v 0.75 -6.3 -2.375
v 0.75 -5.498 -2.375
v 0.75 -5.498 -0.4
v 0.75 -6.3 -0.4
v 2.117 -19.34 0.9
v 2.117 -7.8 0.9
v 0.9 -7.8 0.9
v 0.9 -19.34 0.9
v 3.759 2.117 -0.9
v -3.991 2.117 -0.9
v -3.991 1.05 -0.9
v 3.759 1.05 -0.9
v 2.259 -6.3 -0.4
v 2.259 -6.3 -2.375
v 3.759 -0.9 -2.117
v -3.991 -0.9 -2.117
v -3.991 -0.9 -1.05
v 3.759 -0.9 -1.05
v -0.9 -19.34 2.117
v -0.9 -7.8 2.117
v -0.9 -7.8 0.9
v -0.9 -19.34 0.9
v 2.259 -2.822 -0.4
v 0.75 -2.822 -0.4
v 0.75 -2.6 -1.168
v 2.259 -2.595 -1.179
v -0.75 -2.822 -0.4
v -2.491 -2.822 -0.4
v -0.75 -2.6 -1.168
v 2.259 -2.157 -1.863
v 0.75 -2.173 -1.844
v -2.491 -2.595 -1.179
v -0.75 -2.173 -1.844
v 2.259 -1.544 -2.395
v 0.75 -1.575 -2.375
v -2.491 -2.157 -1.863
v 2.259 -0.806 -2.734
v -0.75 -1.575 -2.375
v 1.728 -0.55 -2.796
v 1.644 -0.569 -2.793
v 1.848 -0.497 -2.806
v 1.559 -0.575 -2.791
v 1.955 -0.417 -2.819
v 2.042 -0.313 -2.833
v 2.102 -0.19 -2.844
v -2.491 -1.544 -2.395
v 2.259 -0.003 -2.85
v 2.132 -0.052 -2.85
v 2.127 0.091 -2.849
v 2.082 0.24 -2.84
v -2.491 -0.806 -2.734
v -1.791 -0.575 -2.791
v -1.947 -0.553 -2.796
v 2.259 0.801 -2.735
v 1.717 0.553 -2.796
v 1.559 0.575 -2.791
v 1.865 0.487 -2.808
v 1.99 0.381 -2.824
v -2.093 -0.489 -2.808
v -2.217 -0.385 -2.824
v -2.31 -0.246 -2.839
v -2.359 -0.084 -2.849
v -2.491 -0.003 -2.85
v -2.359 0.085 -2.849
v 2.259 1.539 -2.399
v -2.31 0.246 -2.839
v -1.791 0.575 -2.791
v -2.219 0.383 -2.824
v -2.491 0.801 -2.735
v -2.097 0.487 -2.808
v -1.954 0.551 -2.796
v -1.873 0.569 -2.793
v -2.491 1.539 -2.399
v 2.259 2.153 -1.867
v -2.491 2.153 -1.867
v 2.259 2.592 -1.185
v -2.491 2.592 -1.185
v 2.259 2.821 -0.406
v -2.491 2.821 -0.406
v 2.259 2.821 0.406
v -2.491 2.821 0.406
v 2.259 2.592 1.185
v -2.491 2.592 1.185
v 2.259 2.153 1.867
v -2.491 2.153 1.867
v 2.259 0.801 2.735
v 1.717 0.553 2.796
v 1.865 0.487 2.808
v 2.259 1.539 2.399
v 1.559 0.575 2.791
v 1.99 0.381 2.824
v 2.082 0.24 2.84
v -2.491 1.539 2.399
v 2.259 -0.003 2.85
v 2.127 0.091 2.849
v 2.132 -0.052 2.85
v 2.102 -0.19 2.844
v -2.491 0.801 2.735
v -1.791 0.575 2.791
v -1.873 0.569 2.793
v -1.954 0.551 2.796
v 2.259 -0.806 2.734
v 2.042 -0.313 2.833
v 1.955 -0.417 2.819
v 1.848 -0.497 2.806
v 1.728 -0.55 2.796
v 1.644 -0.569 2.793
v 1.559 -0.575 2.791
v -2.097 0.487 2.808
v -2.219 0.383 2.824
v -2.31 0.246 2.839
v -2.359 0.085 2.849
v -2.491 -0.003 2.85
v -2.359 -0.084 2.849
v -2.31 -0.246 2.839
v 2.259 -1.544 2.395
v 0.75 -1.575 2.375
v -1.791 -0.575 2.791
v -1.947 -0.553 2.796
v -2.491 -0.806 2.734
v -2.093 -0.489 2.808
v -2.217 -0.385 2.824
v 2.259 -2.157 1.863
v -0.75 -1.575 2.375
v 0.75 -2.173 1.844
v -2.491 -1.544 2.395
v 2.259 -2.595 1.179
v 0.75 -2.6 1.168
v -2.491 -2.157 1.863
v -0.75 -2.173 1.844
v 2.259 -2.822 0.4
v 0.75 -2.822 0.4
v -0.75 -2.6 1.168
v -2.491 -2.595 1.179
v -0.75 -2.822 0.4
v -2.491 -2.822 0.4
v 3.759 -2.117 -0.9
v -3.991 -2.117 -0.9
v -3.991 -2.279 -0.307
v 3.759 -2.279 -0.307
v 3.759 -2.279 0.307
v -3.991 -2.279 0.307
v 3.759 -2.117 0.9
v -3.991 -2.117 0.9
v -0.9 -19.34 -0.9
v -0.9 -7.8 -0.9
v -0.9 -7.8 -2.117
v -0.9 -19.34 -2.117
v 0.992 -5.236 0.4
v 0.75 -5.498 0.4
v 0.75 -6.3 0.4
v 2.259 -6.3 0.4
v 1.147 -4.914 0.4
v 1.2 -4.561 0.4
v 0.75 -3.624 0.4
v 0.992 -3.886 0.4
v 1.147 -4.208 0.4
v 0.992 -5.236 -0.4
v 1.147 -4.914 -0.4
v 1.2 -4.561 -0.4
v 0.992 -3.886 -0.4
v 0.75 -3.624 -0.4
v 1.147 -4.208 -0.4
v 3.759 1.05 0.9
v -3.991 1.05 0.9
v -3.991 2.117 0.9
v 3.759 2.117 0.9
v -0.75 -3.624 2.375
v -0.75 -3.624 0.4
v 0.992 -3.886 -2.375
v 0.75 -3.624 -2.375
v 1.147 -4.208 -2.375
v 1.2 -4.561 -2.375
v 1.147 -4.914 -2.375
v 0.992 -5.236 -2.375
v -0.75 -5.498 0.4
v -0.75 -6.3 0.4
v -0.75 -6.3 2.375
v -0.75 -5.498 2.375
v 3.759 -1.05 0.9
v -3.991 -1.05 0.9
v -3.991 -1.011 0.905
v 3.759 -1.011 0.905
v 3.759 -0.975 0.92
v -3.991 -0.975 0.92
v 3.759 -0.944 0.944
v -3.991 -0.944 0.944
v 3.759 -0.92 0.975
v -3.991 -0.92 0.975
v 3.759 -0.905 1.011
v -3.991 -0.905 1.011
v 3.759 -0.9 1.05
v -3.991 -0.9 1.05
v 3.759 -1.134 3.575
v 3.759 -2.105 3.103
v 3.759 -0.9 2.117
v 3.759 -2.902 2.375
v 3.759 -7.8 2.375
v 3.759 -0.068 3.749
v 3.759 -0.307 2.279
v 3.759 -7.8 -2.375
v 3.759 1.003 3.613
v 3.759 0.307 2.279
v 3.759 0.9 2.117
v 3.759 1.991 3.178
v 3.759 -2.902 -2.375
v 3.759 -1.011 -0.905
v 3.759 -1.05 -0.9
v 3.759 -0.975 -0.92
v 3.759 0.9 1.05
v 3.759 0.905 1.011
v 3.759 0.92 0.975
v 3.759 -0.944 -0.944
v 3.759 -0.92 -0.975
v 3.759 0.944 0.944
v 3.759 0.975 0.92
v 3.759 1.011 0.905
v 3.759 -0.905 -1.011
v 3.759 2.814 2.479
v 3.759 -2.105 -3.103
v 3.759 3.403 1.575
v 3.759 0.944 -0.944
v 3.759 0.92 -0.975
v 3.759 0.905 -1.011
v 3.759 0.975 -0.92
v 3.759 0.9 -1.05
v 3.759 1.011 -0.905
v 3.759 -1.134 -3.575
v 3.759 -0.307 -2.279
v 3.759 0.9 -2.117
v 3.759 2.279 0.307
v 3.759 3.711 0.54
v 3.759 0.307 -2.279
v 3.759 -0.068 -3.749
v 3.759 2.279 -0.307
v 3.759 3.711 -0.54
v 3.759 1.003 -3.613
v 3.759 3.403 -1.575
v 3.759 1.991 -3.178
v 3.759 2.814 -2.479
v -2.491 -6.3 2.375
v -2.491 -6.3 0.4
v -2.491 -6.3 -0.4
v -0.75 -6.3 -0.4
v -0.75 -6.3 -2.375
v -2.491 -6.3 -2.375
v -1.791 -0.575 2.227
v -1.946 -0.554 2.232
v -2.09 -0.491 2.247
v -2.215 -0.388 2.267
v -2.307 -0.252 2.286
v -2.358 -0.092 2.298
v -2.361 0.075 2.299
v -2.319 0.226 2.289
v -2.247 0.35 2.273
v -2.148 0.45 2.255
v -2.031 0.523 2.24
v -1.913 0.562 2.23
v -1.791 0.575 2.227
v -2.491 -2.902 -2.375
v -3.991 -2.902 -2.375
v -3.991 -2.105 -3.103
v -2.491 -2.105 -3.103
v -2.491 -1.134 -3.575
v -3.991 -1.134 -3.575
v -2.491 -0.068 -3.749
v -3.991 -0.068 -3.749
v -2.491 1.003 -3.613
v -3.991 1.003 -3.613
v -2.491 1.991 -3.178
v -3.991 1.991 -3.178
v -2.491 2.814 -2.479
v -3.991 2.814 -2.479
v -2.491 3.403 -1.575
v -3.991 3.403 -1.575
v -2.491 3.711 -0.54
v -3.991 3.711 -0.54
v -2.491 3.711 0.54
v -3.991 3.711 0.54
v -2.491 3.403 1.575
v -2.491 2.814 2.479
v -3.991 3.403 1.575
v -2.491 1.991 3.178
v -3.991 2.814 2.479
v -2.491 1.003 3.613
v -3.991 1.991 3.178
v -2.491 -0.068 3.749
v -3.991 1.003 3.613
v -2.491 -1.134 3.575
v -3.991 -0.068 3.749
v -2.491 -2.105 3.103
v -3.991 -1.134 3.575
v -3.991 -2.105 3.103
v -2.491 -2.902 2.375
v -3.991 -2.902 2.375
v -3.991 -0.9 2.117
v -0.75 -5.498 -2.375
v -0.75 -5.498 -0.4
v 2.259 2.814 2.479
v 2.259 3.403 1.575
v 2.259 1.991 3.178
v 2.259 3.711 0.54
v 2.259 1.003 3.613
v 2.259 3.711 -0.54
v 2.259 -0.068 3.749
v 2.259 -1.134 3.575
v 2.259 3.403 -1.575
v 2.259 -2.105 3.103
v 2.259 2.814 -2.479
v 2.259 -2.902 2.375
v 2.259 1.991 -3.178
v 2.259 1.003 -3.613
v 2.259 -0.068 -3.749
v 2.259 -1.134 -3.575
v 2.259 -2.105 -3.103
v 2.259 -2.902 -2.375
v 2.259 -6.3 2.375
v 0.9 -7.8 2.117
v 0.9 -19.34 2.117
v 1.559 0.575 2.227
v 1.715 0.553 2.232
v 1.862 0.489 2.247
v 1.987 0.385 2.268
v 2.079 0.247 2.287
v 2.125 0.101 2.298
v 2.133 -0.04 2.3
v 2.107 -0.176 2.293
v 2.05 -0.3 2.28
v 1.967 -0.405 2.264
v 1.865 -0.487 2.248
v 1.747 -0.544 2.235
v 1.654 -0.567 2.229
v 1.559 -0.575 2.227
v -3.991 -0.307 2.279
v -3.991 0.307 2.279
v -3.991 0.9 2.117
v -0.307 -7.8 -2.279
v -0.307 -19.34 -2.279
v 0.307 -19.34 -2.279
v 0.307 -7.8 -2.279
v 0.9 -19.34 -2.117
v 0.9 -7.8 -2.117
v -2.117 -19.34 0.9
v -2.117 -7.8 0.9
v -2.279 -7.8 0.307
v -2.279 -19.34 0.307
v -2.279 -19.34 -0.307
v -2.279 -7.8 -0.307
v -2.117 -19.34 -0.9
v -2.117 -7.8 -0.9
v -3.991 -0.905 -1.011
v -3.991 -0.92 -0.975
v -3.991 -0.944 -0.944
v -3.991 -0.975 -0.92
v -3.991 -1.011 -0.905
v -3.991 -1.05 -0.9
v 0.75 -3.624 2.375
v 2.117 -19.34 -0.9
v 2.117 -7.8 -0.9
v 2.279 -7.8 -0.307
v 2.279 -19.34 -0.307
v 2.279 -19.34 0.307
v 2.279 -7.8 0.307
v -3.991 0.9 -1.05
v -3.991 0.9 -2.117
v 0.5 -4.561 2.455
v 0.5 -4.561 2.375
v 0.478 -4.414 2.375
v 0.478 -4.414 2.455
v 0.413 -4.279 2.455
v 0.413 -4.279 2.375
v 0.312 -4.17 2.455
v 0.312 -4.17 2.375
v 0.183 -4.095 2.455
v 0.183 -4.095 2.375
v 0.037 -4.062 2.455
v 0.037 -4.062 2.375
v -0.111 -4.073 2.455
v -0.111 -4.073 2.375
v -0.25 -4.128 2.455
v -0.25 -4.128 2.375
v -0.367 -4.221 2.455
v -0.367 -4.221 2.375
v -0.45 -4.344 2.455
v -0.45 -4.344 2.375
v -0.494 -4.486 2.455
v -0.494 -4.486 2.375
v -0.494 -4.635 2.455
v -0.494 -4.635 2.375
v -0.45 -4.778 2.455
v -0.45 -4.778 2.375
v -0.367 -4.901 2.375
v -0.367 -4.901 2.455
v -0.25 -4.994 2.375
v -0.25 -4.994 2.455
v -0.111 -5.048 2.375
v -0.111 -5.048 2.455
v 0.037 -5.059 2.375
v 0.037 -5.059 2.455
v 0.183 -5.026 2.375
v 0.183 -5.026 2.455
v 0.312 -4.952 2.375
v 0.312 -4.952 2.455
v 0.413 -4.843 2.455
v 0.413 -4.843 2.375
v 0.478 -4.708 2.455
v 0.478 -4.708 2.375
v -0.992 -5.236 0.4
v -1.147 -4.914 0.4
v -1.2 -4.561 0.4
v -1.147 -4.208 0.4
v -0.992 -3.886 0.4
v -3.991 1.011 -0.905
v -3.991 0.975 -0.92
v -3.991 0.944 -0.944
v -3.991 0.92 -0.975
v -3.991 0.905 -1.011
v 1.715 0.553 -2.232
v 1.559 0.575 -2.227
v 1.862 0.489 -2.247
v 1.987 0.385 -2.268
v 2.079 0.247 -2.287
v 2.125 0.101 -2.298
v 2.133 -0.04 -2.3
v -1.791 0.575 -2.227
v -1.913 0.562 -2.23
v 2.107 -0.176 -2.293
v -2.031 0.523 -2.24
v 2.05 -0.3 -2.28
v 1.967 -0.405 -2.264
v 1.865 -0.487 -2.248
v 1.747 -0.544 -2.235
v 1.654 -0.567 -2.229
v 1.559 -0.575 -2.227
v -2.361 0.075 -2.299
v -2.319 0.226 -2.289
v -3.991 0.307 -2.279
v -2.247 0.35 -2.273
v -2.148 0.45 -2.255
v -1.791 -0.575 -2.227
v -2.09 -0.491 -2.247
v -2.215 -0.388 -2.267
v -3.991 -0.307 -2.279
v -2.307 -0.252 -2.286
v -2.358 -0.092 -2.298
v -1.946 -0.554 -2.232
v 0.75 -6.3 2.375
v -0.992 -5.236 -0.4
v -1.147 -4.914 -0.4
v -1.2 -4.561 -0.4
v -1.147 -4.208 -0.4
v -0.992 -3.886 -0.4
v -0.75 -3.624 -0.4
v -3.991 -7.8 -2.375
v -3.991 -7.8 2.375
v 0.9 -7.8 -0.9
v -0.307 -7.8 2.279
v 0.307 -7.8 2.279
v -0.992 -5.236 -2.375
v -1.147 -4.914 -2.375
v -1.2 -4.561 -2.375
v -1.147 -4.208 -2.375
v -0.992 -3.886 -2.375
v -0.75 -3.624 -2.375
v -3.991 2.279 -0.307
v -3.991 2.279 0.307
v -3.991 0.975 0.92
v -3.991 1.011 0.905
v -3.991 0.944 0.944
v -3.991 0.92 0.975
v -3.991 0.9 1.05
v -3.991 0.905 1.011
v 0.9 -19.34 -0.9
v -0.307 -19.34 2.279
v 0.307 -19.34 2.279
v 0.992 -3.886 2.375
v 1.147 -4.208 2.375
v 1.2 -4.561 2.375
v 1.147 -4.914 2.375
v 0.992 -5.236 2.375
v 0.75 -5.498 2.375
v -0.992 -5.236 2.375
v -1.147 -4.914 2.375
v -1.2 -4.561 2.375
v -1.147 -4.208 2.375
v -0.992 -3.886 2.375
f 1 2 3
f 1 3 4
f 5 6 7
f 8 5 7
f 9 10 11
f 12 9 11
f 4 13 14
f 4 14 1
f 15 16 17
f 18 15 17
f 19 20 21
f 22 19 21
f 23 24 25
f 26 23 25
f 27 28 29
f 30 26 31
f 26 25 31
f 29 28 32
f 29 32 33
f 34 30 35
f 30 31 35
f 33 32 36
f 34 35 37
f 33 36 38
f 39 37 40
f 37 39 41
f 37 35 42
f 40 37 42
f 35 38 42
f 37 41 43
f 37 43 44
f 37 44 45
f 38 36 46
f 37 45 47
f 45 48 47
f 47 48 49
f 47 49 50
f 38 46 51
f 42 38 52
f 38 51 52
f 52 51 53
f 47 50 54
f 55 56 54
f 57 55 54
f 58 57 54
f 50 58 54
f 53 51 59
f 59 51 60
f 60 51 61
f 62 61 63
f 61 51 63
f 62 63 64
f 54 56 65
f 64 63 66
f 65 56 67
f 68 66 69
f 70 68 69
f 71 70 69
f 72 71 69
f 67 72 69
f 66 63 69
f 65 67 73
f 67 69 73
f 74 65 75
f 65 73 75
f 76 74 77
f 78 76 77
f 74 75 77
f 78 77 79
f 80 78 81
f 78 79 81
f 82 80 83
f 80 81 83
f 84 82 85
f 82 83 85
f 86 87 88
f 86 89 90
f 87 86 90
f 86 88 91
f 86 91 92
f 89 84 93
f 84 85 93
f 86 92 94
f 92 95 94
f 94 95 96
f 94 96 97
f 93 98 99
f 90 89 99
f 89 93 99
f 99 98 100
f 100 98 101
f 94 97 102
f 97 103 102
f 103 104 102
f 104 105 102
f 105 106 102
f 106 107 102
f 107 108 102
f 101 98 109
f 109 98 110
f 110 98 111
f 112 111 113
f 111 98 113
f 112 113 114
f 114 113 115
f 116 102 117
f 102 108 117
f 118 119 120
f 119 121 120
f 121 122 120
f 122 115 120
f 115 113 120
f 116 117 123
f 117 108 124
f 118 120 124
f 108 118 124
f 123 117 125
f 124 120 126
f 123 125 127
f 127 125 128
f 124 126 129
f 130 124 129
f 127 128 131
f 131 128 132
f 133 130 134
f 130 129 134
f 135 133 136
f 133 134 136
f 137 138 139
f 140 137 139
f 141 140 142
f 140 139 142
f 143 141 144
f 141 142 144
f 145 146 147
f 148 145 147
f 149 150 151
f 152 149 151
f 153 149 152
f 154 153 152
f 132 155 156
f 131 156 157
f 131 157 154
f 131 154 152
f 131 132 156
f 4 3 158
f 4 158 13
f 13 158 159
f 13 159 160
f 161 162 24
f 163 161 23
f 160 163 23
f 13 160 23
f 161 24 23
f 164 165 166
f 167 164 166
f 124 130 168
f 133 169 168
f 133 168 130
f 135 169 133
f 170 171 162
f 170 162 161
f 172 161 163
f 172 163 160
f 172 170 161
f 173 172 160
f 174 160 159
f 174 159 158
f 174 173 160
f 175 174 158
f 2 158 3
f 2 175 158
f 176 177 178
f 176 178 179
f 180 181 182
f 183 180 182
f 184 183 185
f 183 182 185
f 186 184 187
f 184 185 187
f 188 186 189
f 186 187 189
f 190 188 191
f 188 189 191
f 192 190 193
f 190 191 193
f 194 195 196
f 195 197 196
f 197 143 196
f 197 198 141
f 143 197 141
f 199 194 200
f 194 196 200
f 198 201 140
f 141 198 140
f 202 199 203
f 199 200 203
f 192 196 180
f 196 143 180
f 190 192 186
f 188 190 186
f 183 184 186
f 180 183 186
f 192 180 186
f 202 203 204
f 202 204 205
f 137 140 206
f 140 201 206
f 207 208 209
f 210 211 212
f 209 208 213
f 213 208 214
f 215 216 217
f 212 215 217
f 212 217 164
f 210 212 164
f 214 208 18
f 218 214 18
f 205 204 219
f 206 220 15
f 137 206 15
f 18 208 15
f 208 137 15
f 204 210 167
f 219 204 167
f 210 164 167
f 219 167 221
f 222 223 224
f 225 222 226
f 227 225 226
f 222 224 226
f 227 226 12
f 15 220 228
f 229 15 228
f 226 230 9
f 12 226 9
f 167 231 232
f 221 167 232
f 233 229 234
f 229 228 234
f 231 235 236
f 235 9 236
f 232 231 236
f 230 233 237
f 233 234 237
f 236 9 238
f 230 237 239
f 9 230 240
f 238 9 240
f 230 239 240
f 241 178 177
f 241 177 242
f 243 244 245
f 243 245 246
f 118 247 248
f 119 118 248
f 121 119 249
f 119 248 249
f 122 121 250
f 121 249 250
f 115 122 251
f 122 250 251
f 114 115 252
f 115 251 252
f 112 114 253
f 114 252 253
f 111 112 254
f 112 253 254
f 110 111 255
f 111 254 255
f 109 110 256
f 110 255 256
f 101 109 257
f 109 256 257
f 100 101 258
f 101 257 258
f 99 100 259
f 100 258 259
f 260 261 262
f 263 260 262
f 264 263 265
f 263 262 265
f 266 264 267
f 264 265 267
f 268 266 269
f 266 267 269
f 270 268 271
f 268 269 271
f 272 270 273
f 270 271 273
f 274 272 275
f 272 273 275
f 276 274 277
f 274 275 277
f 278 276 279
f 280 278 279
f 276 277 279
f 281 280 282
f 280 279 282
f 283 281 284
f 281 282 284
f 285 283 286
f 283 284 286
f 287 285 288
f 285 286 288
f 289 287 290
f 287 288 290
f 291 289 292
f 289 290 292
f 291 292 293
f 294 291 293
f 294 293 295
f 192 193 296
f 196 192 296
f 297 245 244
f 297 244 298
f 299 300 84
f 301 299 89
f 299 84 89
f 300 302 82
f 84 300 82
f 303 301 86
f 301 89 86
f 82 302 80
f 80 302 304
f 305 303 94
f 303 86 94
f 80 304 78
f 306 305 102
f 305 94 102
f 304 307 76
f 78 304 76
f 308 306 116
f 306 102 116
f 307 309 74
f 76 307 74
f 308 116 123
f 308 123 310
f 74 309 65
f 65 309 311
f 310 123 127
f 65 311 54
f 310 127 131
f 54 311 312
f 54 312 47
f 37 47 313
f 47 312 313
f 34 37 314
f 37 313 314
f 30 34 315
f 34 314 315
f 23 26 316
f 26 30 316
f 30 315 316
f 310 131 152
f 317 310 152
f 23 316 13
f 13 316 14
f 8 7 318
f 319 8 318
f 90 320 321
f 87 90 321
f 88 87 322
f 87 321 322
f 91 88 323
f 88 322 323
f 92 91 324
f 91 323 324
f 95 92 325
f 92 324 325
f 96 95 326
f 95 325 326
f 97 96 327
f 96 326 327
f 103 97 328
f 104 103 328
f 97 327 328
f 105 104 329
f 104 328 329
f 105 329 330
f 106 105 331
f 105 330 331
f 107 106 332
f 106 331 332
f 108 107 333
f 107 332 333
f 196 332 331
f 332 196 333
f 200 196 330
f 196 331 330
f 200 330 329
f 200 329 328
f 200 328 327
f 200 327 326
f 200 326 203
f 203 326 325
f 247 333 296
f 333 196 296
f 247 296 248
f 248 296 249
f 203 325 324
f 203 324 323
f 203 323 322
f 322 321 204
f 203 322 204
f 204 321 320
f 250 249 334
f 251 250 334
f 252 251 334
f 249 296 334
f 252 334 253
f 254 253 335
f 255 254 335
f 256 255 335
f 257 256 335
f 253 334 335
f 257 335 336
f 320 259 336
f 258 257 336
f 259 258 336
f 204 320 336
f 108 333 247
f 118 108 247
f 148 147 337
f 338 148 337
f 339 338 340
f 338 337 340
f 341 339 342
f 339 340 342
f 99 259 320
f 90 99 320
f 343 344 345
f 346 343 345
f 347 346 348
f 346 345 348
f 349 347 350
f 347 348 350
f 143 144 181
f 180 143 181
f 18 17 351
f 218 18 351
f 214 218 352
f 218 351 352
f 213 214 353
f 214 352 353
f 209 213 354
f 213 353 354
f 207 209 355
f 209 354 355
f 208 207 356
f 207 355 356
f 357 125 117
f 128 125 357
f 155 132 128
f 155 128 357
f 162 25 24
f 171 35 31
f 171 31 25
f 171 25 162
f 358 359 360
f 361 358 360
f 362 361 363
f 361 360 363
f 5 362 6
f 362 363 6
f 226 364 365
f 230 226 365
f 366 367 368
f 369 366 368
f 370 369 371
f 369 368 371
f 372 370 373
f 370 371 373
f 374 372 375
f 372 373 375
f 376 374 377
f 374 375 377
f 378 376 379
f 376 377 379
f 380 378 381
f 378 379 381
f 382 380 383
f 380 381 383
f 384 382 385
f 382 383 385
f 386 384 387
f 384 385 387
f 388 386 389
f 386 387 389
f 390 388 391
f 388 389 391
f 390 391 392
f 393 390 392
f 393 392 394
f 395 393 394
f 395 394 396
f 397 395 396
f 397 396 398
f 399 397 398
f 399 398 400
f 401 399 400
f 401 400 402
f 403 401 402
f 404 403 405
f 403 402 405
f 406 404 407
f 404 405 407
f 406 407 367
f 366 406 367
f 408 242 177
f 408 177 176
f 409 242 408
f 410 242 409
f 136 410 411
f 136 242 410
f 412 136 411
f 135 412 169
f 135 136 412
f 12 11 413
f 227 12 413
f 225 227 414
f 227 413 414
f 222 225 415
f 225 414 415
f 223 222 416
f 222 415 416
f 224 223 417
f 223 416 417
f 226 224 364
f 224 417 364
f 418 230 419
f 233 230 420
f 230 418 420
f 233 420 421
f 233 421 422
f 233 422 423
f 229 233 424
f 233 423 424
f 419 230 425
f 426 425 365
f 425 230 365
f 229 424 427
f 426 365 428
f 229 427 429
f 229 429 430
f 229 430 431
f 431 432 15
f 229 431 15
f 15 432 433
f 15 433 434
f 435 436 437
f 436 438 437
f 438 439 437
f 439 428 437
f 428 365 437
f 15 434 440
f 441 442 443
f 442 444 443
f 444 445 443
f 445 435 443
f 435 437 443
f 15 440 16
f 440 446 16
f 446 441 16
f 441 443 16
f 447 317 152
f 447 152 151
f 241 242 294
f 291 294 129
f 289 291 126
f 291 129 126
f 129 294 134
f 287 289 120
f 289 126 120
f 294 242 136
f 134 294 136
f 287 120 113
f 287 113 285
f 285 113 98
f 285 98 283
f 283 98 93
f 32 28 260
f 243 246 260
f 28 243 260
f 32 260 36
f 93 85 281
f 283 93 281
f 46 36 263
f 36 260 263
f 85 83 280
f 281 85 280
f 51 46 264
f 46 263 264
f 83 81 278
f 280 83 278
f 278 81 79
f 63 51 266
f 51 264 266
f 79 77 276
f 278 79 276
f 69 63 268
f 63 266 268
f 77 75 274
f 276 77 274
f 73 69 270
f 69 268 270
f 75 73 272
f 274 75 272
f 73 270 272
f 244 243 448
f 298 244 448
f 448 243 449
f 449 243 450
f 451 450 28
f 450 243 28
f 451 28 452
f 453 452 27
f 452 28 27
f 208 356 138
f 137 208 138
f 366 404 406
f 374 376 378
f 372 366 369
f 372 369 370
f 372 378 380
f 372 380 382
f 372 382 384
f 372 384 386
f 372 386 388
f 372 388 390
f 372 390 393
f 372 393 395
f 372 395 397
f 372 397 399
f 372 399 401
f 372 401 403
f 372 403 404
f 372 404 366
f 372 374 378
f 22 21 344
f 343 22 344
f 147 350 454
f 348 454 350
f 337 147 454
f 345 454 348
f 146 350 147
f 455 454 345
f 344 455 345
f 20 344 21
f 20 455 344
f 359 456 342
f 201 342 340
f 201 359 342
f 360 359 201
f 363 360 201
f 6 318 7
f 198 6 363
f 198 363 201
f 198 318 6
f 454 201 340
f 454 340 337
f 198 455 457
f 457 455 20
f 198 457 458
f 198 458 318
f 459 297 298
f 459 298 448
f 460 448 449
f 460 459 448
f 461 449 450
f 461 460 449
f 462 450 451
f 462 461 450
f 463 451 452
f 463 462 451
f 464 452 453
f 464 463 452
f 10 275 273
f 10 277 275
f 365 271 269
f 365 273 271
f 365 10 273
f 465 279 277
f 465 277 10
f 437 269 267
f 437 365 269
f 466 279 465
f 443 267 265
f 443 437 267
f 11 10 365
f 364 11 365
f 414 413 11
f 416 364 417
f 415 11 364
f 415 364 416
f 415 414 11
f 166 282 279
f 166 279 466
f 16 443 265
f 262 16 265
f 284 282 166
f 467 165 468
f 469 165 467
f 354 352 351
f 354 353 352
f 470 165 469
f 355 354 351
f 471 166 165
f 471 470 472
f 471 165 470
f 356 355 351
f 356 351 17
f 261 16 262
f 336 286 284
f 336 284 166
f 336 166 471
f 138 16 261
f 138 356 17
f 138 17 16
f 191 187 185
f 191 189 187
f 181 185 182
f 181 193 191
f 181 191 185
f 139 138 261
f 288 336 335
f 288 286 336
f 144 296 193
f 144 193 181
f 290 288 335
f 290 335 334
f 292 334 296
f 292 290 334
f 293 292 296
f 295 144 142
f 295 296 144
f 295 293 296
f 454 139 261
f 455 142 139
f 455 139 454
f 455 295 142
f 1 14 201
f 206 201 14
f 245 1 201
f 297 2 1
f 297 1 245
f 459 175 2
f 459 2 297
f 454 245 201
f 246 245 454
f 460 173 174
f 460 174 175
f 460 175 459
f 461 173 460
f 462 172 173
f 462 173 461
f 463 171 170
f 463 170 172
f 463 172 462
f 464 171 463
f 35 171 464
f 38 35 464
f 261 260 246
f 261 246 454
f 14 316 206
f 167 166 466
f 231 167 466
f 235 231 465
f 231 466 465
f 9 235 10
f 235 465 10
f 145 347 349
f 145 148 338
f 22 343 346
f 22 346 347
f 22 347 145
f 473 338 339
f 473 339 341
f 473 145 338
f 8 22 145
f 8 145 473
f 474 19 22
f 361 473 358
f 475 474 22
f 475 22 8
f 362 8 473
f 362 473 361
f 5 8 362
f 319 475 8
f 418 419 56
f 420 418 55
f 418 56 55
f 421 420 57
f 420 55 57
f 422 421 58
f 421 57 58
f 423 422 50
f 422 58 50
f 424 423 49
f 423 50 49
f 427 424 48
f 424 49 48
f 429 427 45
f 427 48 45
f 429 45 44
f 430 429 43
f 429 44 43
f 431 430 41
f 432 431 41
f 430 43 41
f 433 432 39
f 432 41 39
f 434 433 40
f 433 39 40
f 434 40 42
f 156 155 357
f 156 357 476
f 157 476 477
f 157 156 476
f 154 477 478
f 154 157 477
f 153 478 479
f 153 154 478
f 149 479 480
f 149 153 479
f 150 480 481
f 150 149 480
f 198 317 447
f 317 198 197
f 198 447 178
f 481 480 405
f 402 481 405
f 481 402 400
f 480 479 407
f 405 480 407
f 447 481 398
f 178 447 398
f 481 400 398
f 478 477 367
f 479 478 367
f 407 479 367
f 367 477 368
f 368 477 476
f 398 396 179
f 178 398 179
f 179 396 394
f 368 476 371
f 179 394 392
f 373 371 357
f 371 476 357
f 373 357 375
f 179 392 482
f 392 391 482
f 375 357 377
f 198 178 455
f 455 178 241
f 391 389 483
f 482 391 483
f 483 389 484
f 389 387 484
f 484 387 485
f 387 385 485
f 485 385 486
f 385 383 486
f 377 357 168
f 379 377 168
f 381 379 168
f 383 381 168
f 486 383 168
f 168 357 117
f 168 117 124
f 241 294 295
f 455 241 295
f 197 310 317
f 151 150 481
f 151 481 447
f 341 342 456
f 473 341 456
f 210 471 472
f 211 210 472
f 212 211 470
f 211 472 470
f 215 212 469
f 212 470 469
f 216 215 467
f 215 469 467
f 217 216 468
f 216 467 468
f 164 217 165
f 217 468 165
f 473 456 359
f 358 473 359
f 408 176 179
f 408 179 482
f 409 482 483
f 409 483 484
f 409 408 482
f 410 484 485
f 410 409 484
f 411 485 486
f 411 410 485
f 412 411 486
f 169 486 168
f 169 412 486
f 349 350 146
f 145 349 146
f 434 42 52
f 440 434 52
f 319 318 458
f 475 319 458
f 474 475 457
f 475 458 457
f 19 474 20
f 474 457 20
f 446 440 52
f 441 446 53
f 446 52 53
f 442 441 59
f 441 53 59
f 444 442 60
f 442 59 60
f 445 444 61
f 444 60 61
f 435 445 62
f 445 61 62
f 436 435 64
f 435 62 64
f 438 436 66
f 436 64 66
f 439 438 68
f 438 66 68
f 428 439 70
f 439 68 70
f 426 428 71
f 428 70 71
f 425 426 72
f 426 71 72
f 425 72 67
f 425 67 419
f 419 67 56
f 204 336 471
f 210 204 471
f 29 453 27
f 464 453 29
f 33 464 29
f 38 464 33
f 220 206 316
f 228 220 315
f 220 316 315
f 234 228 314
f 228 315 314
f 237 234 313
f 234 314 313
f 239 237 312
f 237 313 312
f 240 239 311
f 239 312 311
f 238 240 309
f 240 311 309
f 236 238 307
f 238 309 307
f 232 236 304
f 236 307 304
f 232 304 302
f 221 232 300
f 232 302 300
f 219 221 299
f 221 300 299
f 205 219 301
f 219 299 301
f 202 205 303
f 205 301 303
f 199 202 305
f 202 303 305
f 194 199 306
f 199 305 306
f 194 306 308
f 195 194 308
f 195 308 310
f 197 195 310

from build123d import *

# Parameters (mm, degrees)
SKETCH3_W               = 4.75
SKETCH3_H               = 5.746351638
BOSS_EXTRUDE1_DEPTH     = 0.4
BOSS_EXTRUDE2_DEPTH     = 2.375
BOSS_EXTRUDE3_DEPTH     = 2.375
CUT_EXTRUDE1_DEPTH      = 12.617443781
CUT_EXTRUDE2_DEPTH      = 10.530326191
CUT_EXTRUDE2_DEPTH_BACK = 10.530326191
WRAP1_OUTLINE_R         = 0.5
WRAP1_DEPTH             = 0.08
BOSS_EXTRUDE4_DEPTH     = 11.54


# Read off the part's stored shape, not the designer's step: Wrap1
with BuildPart() as part:
    # Sketch1 → Revolve1 (revolve)
    with BuildSketch(Plane.XY, mode=Mode.PRIVATE) as revolve1_sk:
        Polygon((-3.990566038, 0), (3.759433962, 0), (3.759433962, 3.75), (2.259433962, 3.75), (2.259433962, 2.85), (-2.490566038, 2.85), (-2.490566038, 3.75), (-3.990566038, 3.75), align=None)
    revolve(revolve1_sk.sketch.rotate(Axis((-3.990566038, 0, 0), (1, 0, 0)), 180), axis=Axis((-3.990566038, 0, 0), (1, 0, 0)))

    # Sketch3 → Boss-Extrude1 (add, symmetric)
    with BuildSketch(Plane.XY):
        with Locations((-0.115566038, -3.426824181)):
            Rectangle(SKETCH3_W, SKETCH3_H)
    extrude(amount=BOSS_EXTRUDE1_DEPTH, both=True)

    # Sketch3<7> → Boss-Extrude2 (add, symmetric)
    with BuildSketch(Plane.XY):
        Polygon((2.259433962, -0.553648362), (2.259433962, -6.3), (-2.490566038, -6.3), (-2.490566038, -0.553648362), (-3.990566038, -0.553648362), (-3.990566038, -7.8), (3.759433962, -7.8), (3.759433962, -0.553648362), align=None)
    extrude(amount=BOSS_EXTRUDE2_DEPTH, both=True)

    # Sketch5 → Boss-Extrude3 (add, symmetric)
    with BuildSketch(Plane(origin=(0, 0, 0), x_dir=(-1, 0, 0), z_dir=(0, 0, -1))):
        with BuildLine():
            Line((-0.75, -6.3), (0.75, -6.3))
            Line((0.75, -6.3), (0.75, -5.497644806))
            ThreePointArc((0.75, -5.497644806), (1.2, -4.560895106), (0.75, -3.624145406))
            Line((0.75, -3.624145406), (0.75, -2.821790212))
            Line((0.75, -2.821790212), (0.75, -1.153612006))
            Line((0.75, -1.153612006), (-0.75, -1.153612006))
            Line((-0.75, -1.153612006), (-0.75, -2.821790212))
            Line((-0.75, -2.821790212), (-0.75, -3.624145406))
            ThreePointArc((-0.75, -3.624145406), (-1.2, -4.560895106), (-0.75, -5.497644806))
            Line((-0.75, -5.497644806), (-0.75, -6.3))
        make_face()
    extrude(amount=BOSS_EXTRUDE3_DEPTH, both=True)

    # Sketch2 → Cut-Extrude1 (cut, through all)
    with BuildSketch(Plane.ZY.offset(3.990566038)):
        with BuildLine():
            Line((-0.9, 2.116601049), (-0.9, 1.05))
            ThreePointArc((-0.9, 1.05), (-0.943933983, 0.943933983), (-1.05, 0.9))
            Line((-1.05, 0.9), (-2.116601049, 0.9))
            ThreePointArc((-2.116601049, 0.9), (-2.3, 0), (-2.116601049, -0.9))
            Line((-2.116601049, -0.9), (-1.05, -0.9))
            ThreePointArc((-1.05, -0.9), (-0.943933983, -0.943933983), (-0.9, -1.05))
            Line((-0.9, -1.05), (-0.9, -2.116601049))
            ThreePointArc((-0.9, -2.116601049), (0, -2.3), (0.9, -2.116601049))
            Line((0.9, -2.116601049), (0.9, -1.05))
            ThreePointArc((0.9, -1.05), (0.943933983, -0.943933983), (1.05, -0.9))
            Line((1.05, -0.9), (2.116601049, -0.9))
            ThreePointArc((2.116601049, -0.9), (2.3, 0), (2.116601049, 0.9))
            Line((2.116601049, 0.9), (1.05, 0.9))
            ThreePointArc((1.05, 0.9), (0.943933983, 0.943933983), (0.9, 1.05))
            Line((0.9, 1.05), (0.9, 2.116601049))
            ThreePointArc((0.9, 2.116601049), (0, 2.3), (-0.9, 2.116601049))
        make_face()
    extrude(amount=-CUT_EXTRUDE1_DEPTH, mode=Mode.SUBTRACT)

    # Sketch4 → Cut-Extrude2 (cut, two sides: drawn at the far end of the back side and taken through both)
    with BuildSketch(Plane.XY.offset(-CUT_EXTRUDE2_DEPTH_BACK)):
        with BuildLine():
            Line((-1.790566038, 0.575), (1.559433962, 0.575))
            ThreePointArc((1.559433962, 0.575), (2.134433962, 0), (1.559433962, -0.575))
            Line((1.559433962, -0.575), (-1.790566038, -0.575))
            ThreePointArc((-1.790566038, -0.575), (-2.365566038, 0), (-1.790566038, 0.575))
        make_face()
    extrude(amount=CUT_EXTRUDE2_DEPTH + CUT_EXTRUDE2_DEPTH_BACK, mode=Mode.SUBTRACT)

    # Wrap1 outline → Wrap1 (add)
    with BuildSketch(Plane.XY.offset(2.375)):
        with Locations((0, -4.560895106)):
            Circle(WRAP1_OUTLINE_R)
    extrude(amount=WRAP1_DEPTH)

    # Sketch7 → Boss-Extrude4 (add)
    with BuildSketch(Plane.XZ.offset(7.8)):
        with BuildLine():
            Line((-0.9, 2.116601049), (-0.9, 0.9))
            Line((-0.9, 0.9), (-2.116601049, 0.9))
            ThreePointArc((-2.116601049, 0.9), (-2.3, 0), (-2.116601049, -0.9))
            Line((-2.116601049, -0.9), (-0.9, -0.9))
            Line((-0.9, -0.9), (-0.9, -2.116601049))
            ThreePointArc((-0.9, -2.116601049), (0, -2.3), (0.9, -2.116601049))
            Line((0.9, -2.116601049), (0.9, -0.9))
            Line((0.9, -0.9), (2.116601049, -0.9))
            ThreePointArc((2.116601049, -0.9), (2.3, 0), (2.116601049, 0.9))
            Line((2.116601049, 0.9), (0.9, 0.9))
            Line((0.9, 0.9), (0.9, 2.116601049))
            ThreePointArc((0.9, 2.116601049), (0, 2.3), (-0.9, 2.116601049))
        make_face()
    extrude(amount=BOSS_EXTRUDE4_DEPTH)


solid = part.part
